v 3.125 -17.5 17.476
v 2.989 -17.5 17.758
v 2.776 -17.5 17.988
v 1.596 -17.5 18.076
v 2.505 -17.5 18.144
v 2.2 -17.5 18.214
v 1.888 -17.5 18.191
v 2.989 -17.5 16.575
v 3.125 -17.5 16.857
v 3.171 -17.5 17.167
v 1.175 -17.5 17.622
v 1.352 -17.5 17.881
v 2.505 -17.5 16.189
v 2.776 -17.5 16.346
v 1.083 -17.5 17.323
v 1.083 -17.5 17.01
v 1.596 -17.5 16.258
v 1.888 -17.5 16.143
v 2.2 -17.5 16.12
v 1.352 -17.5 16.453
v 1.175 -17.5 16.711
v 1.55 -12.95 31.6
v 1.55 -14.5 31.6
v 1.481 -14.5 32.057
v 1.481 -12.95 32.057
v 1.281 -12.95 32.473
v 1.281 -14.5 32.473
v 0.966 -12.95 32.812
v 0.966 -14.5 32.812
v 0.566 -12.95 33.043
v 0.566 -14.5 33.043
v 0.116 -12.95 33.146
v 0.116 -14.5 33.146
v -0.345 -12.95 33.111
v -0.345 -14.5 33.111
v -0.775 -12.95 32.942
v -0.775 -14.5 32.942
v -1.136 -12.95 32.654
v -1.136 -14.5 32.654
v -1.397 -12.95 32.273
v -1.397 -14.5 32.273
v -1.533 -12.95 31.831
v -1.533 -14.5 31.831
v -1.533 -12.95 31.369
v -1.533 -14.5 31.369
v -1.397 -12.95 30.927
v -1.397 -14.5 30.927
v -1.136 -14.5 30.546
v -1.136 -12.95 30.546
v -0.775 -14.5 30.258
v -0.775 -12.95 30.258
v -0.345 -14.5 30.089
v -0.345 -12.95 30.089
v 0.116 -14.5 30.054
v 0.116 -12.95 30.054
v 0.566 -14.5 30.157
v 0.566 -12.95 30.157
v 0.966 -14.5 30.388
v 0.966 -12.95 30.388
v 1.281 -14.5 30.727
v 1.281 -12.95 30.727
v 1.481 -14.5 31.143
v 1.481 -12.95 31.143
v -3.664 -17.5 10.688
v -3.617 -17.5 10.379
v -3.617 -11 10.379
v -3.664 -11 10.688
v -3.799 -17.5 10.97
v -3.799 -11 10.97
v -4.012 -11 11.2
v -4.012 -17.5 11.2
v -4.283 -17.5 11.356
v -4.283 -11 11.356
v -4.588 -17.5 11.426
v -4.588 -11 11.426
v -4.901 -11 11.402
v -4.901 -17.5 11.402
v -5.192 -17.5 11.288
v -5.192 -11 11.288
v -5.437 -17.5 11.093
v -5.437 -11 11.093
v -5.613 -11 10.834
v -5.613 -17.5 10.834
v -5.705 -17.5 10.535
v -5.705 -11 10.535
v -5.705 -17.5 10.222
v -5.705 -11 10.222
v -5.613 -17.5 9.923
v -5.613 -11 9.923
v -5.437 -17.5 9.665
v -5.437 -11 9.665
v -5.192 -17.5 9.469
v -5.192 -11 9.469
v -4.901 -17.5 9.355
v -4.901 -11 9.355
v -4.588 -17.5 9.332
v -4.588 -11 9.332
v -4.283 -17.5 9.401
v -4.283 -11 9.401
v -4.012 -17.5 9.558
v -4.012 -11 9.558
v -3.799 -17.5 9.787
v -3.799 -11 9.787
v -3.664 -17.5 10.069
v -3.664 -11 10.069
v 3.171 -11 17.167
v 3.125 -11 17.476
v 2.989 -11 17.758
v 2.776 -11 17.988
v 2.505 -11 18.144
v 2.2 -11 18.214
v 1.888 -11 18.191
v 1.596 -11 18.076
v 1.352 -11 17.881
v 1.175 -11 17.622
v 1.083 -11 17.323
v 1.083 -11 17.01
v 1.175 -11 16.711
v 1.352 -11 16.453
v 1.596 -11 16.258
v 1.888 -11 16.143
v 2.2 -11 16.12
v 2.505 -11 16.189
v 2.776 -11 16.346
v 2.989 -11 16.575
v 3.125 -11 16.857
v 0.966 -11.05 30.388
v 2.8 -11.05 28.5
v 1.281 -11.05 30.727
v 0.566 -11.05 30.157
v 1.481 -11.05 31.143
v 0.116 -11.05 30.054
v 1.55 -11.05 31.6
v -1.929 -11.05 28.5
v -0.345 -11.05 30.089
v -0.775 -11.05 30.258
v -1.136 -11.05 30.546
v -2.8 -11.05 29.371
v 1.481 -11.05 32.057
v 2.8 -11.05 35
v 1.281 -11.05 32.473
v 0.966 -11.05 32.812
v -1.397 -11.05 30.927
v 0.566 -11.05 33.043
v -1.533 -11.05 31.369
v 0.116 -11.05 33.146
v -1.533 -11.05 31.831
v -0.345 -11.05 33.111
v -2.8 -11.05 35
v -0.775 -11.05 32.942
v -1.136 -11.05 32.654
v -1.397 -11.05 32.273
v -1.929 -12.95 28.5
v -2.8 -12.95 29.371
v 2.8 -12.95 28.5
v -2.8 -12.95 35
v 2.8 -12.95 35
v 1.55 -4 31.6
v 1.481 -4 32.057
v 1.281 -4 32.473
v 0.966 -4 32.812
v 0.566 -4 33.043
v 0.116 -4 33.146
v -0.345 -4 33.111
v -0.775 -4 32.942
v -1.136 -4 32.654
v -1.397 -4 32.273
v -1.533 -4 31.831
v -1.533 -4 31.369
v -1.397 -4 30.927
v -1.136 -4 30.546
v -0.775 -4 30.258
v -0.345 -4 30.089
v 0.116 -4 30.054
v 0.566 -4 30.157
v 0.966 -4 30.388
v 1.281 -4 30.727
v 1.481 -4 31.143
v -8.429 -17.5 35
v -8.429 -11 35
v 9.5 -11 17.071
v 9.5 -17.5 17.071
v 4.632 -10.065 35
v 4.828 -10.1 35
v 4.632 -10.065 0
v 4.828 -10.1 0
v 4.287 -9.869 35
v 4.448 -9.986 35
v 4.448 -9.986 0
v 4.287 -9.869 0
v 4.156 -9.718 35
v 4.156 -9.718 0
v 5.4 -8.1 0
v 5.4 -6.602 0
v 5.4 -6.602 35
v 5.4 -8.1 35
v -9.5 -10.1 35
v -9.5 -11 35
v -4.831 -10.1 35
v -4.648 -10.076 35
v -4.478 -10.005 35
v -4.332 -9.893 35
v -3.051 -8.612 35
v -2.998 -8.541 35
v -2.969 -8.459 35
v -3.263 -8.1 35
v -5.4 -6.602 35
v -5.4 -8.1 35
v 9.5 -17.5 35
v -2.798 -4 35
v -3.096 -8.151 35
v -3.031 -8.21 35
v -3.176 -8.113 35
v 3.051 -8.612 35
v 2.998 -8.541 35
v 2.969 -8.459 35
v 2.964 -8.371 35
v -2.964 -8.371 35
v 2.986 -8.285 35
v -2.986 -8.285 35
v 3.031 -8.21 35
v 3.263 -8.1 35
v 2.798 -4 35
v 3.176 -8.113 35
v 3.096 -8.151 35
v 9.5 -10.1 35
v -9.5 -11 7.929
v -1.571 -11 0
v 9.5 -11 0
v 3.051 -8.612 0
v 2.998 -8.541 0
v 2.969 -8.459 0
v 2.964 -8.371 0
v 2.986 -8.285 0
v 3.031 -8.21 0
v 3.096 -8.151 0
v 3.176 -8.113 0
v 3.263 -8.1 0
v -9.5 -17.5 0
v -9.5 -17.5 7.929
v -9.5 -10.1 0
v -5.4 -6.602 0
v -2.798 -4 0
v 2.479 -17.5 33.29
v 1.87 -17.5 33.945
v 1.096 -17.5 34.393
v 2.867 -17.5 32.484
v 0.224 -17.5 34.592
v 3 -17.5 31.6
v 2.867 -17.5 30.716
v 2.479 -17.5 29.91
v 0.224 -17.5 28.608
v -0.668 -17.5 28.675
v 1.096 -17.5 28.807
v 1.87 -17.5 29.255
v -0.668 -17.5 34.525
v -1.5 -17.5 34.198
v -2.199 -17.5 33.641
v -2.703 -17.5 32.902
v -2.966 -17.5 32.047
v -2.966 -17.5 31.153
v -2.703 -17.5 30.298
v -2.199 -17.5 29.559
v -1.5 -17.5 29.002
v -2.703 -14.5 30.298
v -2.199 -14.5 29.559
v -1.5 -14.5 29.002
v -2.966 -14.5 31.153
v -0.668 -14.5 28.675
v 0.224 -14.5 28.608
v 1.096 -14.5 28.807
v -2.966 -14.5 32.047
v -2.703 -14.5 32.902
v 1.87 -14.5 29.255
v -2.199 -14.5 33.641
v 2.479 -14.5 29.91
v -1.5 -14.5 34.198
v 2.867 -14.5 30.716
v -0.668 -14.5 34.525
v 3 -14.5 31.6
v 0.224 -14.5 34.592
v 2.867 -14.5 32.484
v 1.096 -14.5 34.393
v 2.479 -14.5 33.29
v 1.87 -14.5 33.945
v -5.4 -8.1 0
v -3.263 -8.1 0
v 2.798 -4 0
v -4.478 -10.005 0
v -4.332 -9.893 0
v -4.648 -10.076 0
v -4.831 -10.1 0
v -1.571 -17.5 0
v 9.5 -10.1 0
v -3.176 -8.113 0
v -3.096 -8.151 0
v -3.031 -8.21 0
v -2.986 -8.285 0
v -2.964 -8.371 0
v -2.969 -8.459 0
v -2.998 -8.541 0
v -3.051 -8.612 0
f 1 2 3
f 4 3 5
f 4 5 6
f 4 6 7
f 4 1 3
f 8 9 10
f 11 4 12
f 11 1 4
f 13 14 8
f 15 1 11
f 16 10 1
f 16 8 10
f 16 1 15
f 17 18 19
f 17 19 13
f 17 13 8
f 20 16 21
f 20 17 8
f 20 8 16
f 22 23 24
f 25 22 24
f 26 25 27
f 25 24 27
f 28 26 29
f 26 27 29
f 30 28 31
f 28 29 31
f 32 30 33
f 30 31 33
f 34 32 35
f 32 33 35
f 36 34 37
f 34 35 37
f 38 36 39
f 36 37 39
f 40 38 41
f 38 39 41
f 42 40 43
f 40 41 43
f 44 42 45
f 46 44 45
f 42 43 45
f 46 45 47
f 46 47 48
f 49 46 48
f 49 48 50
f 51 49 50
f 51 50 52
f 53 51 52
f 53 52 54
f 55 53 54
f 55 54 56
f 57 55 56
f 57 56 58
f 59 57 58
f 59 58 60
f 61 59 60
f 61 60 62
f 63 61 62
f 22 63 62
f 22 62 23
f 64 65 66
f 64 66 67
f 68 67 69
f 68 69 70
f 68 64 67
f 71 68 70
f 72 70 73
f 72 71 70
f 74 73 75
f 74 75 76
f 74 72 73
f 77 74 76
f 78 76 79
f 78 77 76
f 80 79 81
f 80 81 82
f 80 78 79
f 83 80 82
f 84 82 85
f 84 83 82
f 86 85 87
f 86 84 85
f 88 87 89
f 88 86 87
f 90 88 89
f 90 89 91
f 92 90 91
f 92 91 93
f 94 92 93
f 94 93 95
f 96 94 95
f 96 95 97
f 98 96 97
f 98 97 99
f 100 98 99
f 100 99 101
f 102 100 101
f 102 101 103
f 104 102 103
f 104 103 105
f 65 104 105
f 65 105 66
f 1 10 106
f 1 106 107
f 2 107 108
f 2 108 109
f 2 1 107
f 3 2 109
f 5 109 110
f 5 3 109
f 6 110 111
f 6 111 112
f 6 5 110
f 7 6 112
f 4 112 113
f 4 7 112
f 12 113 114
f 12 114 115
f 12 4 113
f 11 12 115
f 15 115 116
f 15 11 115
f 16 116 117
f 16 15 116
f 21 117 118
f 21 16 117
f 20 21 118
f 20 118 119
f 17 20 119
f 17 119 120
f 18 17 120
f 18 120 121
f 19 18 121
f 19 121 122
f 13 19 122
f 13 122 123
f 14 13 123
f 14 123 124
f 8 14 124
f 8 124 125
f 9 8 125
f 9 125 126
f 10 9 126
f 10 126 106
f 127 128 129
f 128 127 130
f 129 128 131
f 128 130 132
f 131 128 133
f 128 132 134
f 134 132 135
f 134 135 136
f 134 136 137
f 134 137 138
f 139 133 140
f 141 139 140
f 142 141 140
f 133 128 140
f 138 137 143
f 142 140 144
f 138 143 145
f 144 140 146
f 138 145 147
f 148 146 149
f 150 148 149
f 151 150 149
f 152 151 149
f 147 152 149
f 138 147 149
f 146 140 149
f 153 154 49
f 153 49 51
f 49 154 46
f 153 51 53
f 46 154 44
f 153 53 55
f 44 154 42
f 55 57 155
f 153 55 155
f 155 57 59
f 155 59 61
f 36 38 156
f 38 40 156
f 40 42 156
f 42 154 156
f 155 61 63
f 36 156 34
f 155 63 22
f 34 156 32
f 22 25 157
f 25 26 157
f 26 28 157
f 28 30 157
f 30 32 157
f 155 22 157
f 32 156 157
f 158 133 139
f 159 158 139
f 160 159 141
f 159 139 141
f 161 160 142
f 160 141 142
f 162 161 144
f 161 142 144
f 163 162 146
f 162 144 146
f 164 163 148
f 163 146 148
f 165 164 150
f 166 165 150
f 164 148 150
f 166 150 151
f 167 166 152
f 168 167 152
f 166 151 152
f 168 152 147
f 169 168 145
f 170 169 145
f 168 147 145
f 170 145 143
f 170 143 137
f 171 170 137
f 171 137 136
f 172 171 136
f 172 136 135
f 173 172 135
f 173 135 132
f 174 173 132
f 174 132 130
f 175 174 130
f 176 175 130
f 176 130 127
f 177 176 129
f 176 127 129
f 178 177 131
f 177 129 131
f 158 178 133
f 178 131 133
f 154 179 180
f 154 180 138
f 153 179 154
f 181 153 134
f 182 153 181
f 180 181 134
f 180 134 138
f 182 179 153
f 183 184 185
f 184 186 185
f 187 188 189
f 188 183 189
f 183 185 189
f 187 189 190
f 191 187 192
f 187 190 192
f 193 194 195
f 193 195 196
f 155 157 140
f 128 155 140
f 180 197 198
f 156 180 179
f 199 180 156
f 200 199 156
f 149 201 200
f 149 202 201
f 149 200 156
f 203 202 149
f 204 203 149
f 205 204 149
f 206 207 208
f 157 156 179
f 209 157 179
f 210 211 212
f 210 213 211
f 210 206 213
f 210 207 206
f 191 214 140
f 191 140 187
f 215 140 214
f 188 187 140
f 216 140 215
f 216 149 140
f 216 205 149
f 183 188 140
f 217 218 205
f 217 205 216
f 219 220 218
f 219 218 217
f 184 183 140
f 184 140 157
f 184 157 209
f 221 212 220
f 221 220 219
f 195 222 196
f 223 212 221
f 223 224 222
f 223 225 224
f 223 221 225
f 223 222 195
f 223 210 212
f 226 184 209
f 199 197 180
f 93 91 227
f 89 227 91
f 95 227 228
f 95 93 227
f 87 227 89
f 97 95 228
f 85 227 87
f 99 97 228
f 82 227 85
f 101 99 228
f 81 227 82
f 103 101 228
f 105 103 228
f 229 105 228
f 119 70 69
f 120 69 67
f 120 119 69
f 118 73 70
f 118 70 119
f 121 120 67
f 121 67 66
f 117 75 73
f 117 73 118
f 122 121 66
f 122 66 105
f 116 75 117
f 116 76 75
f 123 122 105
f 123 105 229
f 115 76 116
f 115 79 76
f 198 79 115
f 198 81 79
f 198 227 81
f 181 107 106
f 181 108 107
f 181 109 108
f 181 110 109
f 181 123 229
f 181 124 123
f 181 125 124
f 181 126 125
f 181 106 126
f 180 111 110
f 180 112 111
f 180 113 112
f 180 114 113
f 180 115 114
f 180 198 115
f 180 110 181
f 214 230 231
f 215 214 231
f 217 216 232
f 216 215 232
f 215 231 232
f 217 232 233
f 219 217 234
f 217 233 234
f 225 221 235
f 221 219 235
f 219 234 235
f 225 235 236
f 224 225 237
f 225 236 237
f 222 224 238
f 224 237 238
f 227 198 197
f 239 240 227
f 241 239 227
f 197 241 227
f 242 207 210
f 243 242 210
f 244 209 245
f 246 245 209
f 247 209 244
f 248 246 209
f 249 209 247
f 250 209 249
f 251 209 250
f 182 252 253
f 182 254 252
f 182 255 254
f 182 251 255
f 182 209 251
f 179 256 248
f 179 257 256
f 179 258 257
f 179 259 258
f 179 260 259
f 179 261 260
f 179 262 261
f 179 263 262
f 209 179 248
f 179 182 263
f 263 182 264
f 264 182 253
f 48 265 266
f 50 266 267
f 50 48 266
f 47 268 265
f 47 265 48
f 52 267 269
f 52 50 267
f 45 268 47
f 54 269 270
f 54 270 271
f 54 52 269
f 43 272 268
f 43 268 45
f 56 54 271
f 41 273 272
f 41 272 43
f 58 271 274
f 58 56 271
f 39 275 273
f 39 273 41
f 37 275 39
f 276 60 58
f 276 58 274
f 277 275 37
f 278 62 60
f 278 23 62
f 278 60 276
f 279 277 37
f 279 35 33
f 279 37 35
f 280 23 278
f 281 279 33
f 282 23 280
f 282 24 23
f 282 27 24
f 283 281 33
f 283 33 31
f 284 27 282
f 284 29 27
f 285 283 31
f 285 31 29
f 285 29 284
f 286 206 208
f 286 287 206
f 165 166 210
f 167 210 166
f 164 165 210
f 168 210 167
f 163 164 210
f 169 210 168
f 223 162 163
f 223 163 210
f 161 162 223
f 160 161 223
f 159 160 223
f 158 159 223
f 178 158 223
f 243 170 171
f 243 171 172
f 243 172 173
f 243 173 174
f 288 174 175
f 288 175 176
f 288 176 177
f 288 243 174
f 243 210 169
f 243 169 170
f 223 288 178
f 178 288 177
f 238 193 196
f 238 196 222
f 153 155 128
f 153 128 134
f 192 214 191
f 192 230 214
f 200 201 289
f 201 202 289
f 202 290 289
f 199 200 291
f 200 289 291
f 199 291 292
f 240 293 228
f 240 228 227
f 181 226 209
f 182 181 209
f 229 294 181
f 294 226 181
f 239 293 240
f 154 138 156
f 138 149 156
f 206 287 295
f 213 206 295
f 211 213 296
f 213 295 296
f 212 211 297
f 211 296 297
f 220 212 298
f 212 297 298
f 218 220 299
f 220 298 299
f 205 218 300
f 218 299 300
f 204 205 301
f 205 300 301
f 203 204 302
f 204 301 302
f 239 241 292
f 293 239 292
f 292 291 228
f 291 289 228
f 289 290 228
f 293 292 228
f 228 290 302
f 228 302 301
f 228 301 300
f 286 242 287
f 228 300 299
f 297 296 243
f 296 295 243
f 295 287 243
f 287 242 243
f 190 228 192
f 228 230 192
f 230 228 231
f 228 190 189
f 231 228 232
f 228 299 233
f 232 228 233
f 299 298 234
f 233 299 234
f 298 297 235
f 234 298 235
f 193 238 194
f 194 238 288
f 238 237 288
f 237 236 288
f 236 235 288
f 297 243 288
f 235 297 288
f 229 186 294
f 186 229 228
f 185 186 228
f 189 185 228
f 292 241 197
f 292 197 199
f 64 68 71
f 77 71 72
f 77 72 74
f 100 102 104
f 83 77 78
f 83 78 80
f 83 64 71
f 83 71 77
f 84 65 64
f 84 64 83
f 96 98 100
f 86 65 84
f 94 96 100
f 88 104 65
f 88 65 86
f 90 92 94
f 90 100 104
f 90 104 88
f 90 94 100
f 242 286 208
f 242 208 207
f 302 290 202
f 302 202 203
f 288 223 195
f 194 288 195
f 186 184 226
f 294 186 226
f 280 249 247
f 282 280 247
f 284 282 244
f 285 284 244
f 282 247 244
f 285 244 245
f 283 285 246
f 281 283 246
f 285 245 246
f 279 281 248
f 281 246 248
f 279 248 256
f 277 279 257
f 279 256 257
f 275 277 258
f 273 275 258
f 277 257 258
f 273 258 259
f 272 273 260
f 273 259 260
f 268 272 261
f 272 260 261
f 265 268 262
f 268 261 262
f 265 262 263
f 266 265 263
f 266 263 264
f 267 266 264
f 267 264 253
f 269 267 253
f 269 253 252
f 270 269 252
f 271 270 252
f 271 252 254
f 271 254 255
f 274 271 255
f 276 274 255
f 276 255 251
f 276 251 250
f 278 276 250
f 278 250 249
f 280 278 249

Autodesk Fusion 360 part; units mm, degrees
sketch "Sketch1" plane through (0, 0, 0) normal (0, 0, 1) x (1, 0, 0)
  line L0 (10, 4.8314) -> (10, 9.5)
  line L1 (-4.4022, -9.8222) -> (-3.1214, -8.5414)
  arc A0 (3.2628, -8.2) -> (3.1214, -8.5414) centre (3.2628, -8.4) ccw
  line L2 (-5.5, 6.5607) -> (-5.5, 8.2)
  line L3 (-5.5, -6.5607) -> (-2.8393, -3.9)
  line L4 (-4.8314, 10) -> (-9.5, 10)
  line L5 (2.8393, 3.9) -> (-2.8393, 3.9)
  arc A1 (-10, -9.5) -> (-9.5, -10) centre (-9.5, -9.5) ccw
  line L6 (9.5, 10) -> (4.8314, 10)
  arc A2 (-3.2628, 8.2) -> (-3.1214, 8.5414) centre (-3.2628, 8.4) ccw
  line L7 (-8.2, 3.2628) -> (-8.2, 5.5)
  line L8 (2.8393, -3.9) -> (5.5, -6.5607)
  line L9 (-10, 9.5) -> (-10, 4.9)
  arc A3 (9.5, -10) -> (10, -9.5) centre (9.5, -9.5) ccw
  line L10 (-6.5607, -5.5) -> (-8.2, -5.5)
  line L11 (3.1214, -8.5414) -> (4.2336, -9.6536)
  line L12 (-8.2, -5.5) -> (-8.2, -3.2628)
  line L13 (-9.9987, -4.7917) -> (-10, -9.5)
  line L14 (10, -9.5) -> (10, -4.8314)
  line L15 (3.2628, 8.2) -> (5.5, 8.2)
  arc A4 (8.5414, -3.1214) -> (8.2, -3.2628) centre (8.4, -3.2628) ccw
  arc A5 (-3.1214, -8.5414) -> (-3.2628, -8.2) centre (-3.2628, -8.4) ccw
  line L16 (4.8314, -10) -> (9.5, -10)
  line L17 (-3.9, -2.8393) -> (-6.5607, -5.5)
  line L18 (-3.2628, -8.2) -> (-5.5, -8.2)
  line L19 (3.9, 2.8393) -> (6.5607, 5.5)
  line L20 (-3.1214, 8.5414) -> (-4.4312, 9.8494)
  line L21 (8.2, -5.5) -> (6.5607, -5.5)
  arc A6 (-10, 4.9) -> (-9.8494, 4.4312) centre (-9.3734, 4.8428) ccw
  line L22 (8.5414, 3.1214) -> (9.8222, 4.4022)
  circle A7 centre (0, 0) radius 2.1
  line L23 (3.9, -2.8393) -> (3.9, 2.8393)
  line L24 (6.5607, -5.5) -> (3.9, -2.8393)
  line L25 (5.5, -6.5607) -> (5.5, -8.2)
  line L26 (8.2, -3.2628) -> (8.2, -5.5)
  arc A8 (10, -4.8314) -> (9.8222, -4.4022) centre (9.3929, -4.8314) ccw
  line L27 (-5.5, -8.2) -> (-5.5, -6.5607)
  arc A9 (-4.8314, -10) -> (-4.4022, -9.8222) centre (-4.8314, -9.3929) ccw
  line L28 (5.5, -8.2) -> (3.2628, -8.2)
  line L29 (9.8222, -4.4022) -> (8.5414, -3.1214)
  arc A10 (-9.8222, -4.4022) -> (-9.9987, -4.7917) centre (-9.3929, -4.8314) ccw
  line L30 (-8.5414, -3.1214) -> (-9.8222, -4.4022)
  arc A11 (4.2336, -9.6536) -> (4.8314, -10) centre (4.8837, -9.2207) ccw
  arc A12 (-8.2, -3.2628) -> (-8.5414, -3.1214) centre (-8.4, -3.2628) ccw
  line L31 (-9.5, -10) -> (-4.8314, -10)
  line L32 (-2.8393, -3.9) -> (2.8393, -3.9)
  line L33 (-5.8557, 10) -> (6.4454, 10) construction
  arc A13 (10, 9.5) -> (9.5, 10) centre (9.5, 9.5) ccw
  arc A14 (3.1214, 8.5414) -> (3.2628, 8.2) centre (3.2628, 8.4) ccw
  line L34 (-5.5, 8.2) -> (-3.2628, 8.2)
  line L35 (-3.9, 2.8393) -> (-3.9, -2.8393)
  line L36 (4.4022, 9.8222) -> (3.1214, 8.5414)
  arc A15 (4.8314, 10) -> (4.4022, 9.8222) centre (4.8314, 9.3929) ccw
  line L37 (-9.8494, 4.4312) -> (-8.5414, 3.1214)
  line L38 (5.5, 8.2) -> (5.5, 6.5607)
  line L39 (6.5607, 5.5) -> (8.2, 5.5)
  arc A16 (-8.5414, 3.1214) -> (-8.2, 3.2628) centre (-8.4, 3.2628) ccw
  line L40 (8.2, 5.5) -> (8.2, 3.2628)
  arc A17 (-4.4312, 9.8494) -> (-4.8314, 10) centre (-4.8314, 9.3929) ccw
  line L41 (-8.2, 5.5) -> (-6.5607, 5.5)
  arc A18 (9.8222, 4.4022) -> (10, 4.8314) centre (9.3929, 4.8314) ccw
  arc A19 (-9.5, 10) -> (-10, 9.5) centre (-9.5, 9.5) ccw
  line L42 (-2.8393, 3.9) -> (-5.5, 6.5607)
  line L43 (-6.5607, 5.5) -> (-3.9, 2.8393)
  arc A20 (8.2, 3.2628) -> (8.5414, 3.1214) centre (8.4, 3.2628) ccw
  line L44 (5.5, 6.5607) -> (2.8393, 3.9)
  line L45 (5.4, -6.6021) -> (5.4, -8.1)
  line L46 (5.4, -8.1) -> (3.2628, -8.1)
  arc A21 (3.2628, -8.1) -> (3.0507, -8.6121) centre (3.2628, -8.4) ccw
  line L47 (3.0507, -8.6121) -> (4.1561, -9.7175)
  arc A22 (4.1561, -9.7175) -> (4.8282, -10.1) centre (4.8837, -9.2207) ccw
  line L48 (4.8282, -10.1) -> (9.5, -10.1)
  arc A23 (9.5, -10.1) -> (10.1, -9.5) centre (9.5, -9.5) ccw
  line L49 (10.1, -9.5) -> (10.1, -4.8314)
  arc A24 (10.1, -4.8314) -> (9.8929, -4.3315) centre (9.3929, -4.8314) ccw
  line L50 (9.8929, -4.3315) -> (8.6121, -3.0507)
  arc A25 (8.6121, -3.0507) -> (8.1, -3.2628) centre (8.4, -3.2628) ccw
  line L51 (8.1, -3.2628) -> (8.1, -5.4)
  line L52 (8.1, -5.4) -> (6.6021, -5.4)
  line L53 (6.6021, -5.4) -> (4, -2.7979)
  line L54 (4, -2.7979) -> (4, 2.7979)
  line L55 (4, 2.7979) -> (6.6021, 5.4)
  line L56 (6.6021, 5.4) -> (8.1, 5.4)
  line L57 (8.1, 5.4) -> (8.1, 3.2628)
  arc A26 (8.1, 3.2628) -> (8.6121, 3.0507) centre (8.4, 3.2628) ccw
  line L58 (8.6121, 3.0507) -> (9.8929, 4.3315)
  arc A27 (9.8929, 4.3315) -> (10.1, 4.8314) centre (9.3929, 4.8314) ccw
  line L59 (10.1, 4.8314) -> (10.1, 9.5)
  arc A28 (10.1, 9.5) -> (9.5, 10.1) centre (9.5, 9.5) ccw
  line L60 (9.5, 10.1) -> (4.8314, 10.1)
  arc A29 (4.8314, 10.1) -> (4.3315, 9.8929) centre (4.8314, 9.3929) ccw
  line L61 (4.3315, 9.8929) -> (3.0507, 8.6121)
  arc A30 (3.0507, 8.6121) -> (3.2628, 8.1) centre (3.2628, 8.4) ccw
  line L62 (3.2628, 8.1) -> (5.4, 8.1)
  line L63 (5.4, 8.1) -> (5.4, 6.6021)
  line L64 (5.4, 6.6021) -> (2.7979, 4)
  line L65 (2.7979, 4) -> (-2.7979, 4)
  line L66 (-2.7979, 4) -> (-5.4, 6.6021)
  line L67 (-5.4, 6.6021) -> (-5.4, 8.1)
  line L68 (-5.4, 8.1) -> (-3.2628, 8.1)
  arc A31 (-3.2628, 8.1) -> (-3.0509, 8.6124) centre (-3.2628, 8.4) ccw
  line L69 (-3.0509, 8.6124) -> (-4.3627, 9.9223)
  arc A32 (-4.3627, 9.9223) -> (-4.8314, 10.1) centre (-4.8314, 9.3929) ccw
  line L70 (-4.8314, 10.1) -> (-9.5, 10.1)
  arc A33 (-9.5, 10.1) -> (-10.1, 9.5) centre (-9.5, 9.5) ccw
  line L71 (-10.1, 9.5) -> (-10.1, 4.9044)
  arc A34 (-10.1, 4.9044) -> (-9.9226, 4.363) centre (-9.3734, 4.8428) ccw
  line L72 (-9.9226, 4.363) -> (-8.6124, 3.0509)
  arc A35 (-8.6124, 3.0509) -> (-8.1, 3.2628) centre (-8.4, 3.2628) ccw
  line L73 (-8.1, 3.2628) -> (-8.1, 5.4)
  line L74 (-8.1, 5.4) -> (-6.6021, 5.4)
  line L75 (-6.6021, 5.4) -> (-4, 2.7979)
  line L76 (-4, 2.7979) -> (-4, -2.7979)
  line L77 (-4, -2.7979) -> (-6.6021, -5.4)
  line L78 (-6.6021, -5.4) -> (-8.1, -5.4)
  line L79 (-8.1, -5.4) -> (-8.1, -3.2628)
  arc A36 (-8.1, -3.2628) -> (-8.6121, -3.0507) centre (-8.4, -3.2628) ccw
  line L80 (-8.6121, -3.0507) -> (-9.8929, -4.3315)
  arc A37 (-9.8929, -4.3315) -> (-10.0987, -4.7886) centre (-9.3929, -4.8314) ccw
  line L81 (-10.0987, -4.7886) -> (-10.1, -9.4997)
  arc A38 (-10.1, -9.4997) -> (-9.5, -10.1) centre (-9.5, -9.5) ccw
  line L82 (-9.5, -10.1) -> (-4.8314, -10.1)
  arc A39 (-4.8314, -10.1) -> (-4.3315, -9.8929) centre (-4.8314, -9.3929) ccw
  line L83 (-4.3315, -9.8929) -> (-3.0507, -8.6121)
  arc A40 (-3.0507, -8.6121) -> (-3.2628, -8.1) centre (-3.2628, -8.4) ccw
  line L84 (-3.2628, -8.1) -> (-5.4, -8.1)
  line L85 (-5.4, -8.1) -> (-5.4, -6.6021)
  line L86 (-5.4, -6.6021) -> (-2.7979, -4)
  line L87 (-2.7979, -4) -> (2.7979, -4)
  line L88 (2.7979, -4) -> (5.4, -6.6021)
  line L89 (-9.5, -9.5) -> (9.5, -9.5)
  line L90 (9.5, -9.5) -> (9.5, -17.5)
  line L91 (9.5, -17.5) -> (-9.5, -17.5)
  line L92 (-9.5, -17.5) -> (-9.5, -9.5)
  dimension "d1" = 0.1
  dimension "d2" = 8
extrude "Extrude1" add sketch "Sketch1" along normal blind 35 contours L47 A22 L48 L82 A39 L83 L89 L90 L91 L92 | L45 L46 A21 L47 L83 A40 L84 L85 L86 L87 L88 L89
sketch "Sketch2" plane through (0, -17.5, 0) normal (0, -1, 0) x (1, 0, 0)
  line L0 (-9.5, 0) -> (9.5, 0)
  line L1 (9.5, 0) -> (9.5, 35)
  line L2 (9.5, 35) -> (-9.5, 35)
  line L3 (-9.5, 35) -> (-9.5, 0)
  line L4 (13.7568, 12.4504) -> (-13.7568, 12.5496) construction
  line L5 (0.3182, 26.2532) -> (13.7532, 12.8182)
  line L6 (13.7532, 12.8182) -> (-0.3182, -1.2532)
  line L7 (-0.3182, -1.2532) -> (-13.7532, 12.1818)
  line L8 (-13.7532, 12.1818) -> (0.3182, 26.2532)
  line L9 (0.3182, 26.2532) -> (-0.3182, -1.2532) construction
  line L10 (13.7532, 12.8182) -> (-13.7532, 12.1818) construction
  line L11 (-13.7532, 12.1818) -> (-8.3085, 6.7371) construction
  line L12 (-8.3085, 6.7371) -> (5.7629, 20.8085) construction
  line L13 (-8.3085, 6.7371) -> (-4.6669, 10.3787) construction
  line L14 (-4.6669, 10.3787) -> (2.1213, 17.1669) construction
  line L15 (2.1213, 17.1669) -> (5.7629, 20.8085) construction
  line L16 (2.1213, 17.1669) -> (5.7629, 20.8085) construction
  circle A0 centre (2.1213, 17.1669) radius 1.05
  circle A1 centre (-4.6669, 10.3787) radius 1.05
  line L17 (0.3182, 26.2532) -> (-8.4286, 35)
  point P0 (0, 12.5)
  dimension "d15" = 19.9
  dimension "d16" = 7.7
  dimension "d17" = 5.15
  dimension "d18" = 9.6
  dimension "d19" = 5.15
  dimension "d20" = 2.1
  dimension "d21" = 2.1
extrude "Extrude2" cut sketch "Sketch2" against normal blind 6.5 contours L0 L1 L3 L5 L6 L7 L8 | L0 L1 L6 | L2 L3 L8 L17
sketch "Sketch3" plane through (0, -17.5, 0) normal (0, -1, 0) x (1, 0, 0)
  line L0 (-8.4286, 35) -> (9.5, 17.0714)
  line L1 (9.5, 17.0714) -> (9.5, 35)
  line L2 (9.5, 35) -> (-8.4286, 35)
  line L3 (9.5, 35) -> (0, 35) construction
  circle A0 centre (0, 31.6) radius 1.55
  circle A1 centre (0, 31.6) radius 3
  dimension "d22" = 3.1
  dimension "d23" = 6
extrude "Extrude3" cut sketch "Sketch3" against normal blind 20 contours A0
extrude "Extrude4" cut sketch "Sketch3" against normal blind 3 contours A1
sketch "Sketch4" plane through (0, 0, 35) normal (0, 0, 1) x (-1, 0, 0)
  line L0 (8.4286, 11) -> (8.4286, 17.5)
  line L1 (8.4286, 17.5) -> (-9.5, 17.5)
  line L2 (-9.5, 17.5) -> (-9.5, 10.1)
  line L3 (-9.5, 10.1) -> (-4.8282, 10.1)
  arc A0 (-4.1561, 9.7175) -> (-4.8282, 10.1) centre (-4.8837, 9.2207) ccw
  line L4 (-4.1561, 9.7175) -> (-3.0507, 8.6121)
  arc A1 (-3.2628, 8.1) -> (-3.0507, 8.6121) centre (-3.2628, 8.4) ccw
  line L5 (-3.2628, 8.1) -> (-5.4, 8.1)
  line L6 (-5.4, 8.1) -> (-5.4, 6.6021)
  line L7 (-5.4, 6.6021) -> (-2.7979, 4)
  line L8 (-2.7979, 4) -> (2.7979, 4)
  line L9 (2.7979, 4) -> (5.4, 6.6021)
  line L10 (5.4, 6.6021) -> (5.4, 8.1)
  line L11 (5.4, 8.1) -> (3.2628, 8.1)
  arc A2 (3.0507, 8.6121) -> (3.2628, 8.1) centre (3.2628, 8.4) ccw
  line L12 (3.0507, 8.6121) -> (4.3315, 9.8929)
  arc A3 (4.8314, 10.1) -> (4.3315, 9.8929) centre (4.8314, 9.3929) ccw
  line L13 (4.8314, 10.1) -> (9.5, 10.1)
  line L14 (9.5, 10.1) -> (9.5, 11)
  line L15 (9.5, 11) -> (8.4286, 11)
  line L16 (0, 4) -> (0, 17.5) construction
  line L17 (2.8, 12.95) -> (-2.8, 12.95)
  line L18 (-2.8, 12.95) -> (-2.8, 11.05)
  line L19 (-2.8, 11.05) -> (2.8, 11.05)
  line L20 (2.8, 11.05) -> (2.8, 12.95)
  line L21 (2.8, 12.95) -> (-2.8, 11.05) construction
  line L22 (-2.8, 12.95) -> (2.8, 11.05) construction
  point P0 (0, 12)
  point P1 (0, 17.5)
  dimension "d28" = 5.6
  dimension "d29" = 1.9
  dimension "d30" = 5.5
extrude "Extrude5" cut sketch "Sketch4" against normal blind 6.5 contours L17 L18 L19 L20
